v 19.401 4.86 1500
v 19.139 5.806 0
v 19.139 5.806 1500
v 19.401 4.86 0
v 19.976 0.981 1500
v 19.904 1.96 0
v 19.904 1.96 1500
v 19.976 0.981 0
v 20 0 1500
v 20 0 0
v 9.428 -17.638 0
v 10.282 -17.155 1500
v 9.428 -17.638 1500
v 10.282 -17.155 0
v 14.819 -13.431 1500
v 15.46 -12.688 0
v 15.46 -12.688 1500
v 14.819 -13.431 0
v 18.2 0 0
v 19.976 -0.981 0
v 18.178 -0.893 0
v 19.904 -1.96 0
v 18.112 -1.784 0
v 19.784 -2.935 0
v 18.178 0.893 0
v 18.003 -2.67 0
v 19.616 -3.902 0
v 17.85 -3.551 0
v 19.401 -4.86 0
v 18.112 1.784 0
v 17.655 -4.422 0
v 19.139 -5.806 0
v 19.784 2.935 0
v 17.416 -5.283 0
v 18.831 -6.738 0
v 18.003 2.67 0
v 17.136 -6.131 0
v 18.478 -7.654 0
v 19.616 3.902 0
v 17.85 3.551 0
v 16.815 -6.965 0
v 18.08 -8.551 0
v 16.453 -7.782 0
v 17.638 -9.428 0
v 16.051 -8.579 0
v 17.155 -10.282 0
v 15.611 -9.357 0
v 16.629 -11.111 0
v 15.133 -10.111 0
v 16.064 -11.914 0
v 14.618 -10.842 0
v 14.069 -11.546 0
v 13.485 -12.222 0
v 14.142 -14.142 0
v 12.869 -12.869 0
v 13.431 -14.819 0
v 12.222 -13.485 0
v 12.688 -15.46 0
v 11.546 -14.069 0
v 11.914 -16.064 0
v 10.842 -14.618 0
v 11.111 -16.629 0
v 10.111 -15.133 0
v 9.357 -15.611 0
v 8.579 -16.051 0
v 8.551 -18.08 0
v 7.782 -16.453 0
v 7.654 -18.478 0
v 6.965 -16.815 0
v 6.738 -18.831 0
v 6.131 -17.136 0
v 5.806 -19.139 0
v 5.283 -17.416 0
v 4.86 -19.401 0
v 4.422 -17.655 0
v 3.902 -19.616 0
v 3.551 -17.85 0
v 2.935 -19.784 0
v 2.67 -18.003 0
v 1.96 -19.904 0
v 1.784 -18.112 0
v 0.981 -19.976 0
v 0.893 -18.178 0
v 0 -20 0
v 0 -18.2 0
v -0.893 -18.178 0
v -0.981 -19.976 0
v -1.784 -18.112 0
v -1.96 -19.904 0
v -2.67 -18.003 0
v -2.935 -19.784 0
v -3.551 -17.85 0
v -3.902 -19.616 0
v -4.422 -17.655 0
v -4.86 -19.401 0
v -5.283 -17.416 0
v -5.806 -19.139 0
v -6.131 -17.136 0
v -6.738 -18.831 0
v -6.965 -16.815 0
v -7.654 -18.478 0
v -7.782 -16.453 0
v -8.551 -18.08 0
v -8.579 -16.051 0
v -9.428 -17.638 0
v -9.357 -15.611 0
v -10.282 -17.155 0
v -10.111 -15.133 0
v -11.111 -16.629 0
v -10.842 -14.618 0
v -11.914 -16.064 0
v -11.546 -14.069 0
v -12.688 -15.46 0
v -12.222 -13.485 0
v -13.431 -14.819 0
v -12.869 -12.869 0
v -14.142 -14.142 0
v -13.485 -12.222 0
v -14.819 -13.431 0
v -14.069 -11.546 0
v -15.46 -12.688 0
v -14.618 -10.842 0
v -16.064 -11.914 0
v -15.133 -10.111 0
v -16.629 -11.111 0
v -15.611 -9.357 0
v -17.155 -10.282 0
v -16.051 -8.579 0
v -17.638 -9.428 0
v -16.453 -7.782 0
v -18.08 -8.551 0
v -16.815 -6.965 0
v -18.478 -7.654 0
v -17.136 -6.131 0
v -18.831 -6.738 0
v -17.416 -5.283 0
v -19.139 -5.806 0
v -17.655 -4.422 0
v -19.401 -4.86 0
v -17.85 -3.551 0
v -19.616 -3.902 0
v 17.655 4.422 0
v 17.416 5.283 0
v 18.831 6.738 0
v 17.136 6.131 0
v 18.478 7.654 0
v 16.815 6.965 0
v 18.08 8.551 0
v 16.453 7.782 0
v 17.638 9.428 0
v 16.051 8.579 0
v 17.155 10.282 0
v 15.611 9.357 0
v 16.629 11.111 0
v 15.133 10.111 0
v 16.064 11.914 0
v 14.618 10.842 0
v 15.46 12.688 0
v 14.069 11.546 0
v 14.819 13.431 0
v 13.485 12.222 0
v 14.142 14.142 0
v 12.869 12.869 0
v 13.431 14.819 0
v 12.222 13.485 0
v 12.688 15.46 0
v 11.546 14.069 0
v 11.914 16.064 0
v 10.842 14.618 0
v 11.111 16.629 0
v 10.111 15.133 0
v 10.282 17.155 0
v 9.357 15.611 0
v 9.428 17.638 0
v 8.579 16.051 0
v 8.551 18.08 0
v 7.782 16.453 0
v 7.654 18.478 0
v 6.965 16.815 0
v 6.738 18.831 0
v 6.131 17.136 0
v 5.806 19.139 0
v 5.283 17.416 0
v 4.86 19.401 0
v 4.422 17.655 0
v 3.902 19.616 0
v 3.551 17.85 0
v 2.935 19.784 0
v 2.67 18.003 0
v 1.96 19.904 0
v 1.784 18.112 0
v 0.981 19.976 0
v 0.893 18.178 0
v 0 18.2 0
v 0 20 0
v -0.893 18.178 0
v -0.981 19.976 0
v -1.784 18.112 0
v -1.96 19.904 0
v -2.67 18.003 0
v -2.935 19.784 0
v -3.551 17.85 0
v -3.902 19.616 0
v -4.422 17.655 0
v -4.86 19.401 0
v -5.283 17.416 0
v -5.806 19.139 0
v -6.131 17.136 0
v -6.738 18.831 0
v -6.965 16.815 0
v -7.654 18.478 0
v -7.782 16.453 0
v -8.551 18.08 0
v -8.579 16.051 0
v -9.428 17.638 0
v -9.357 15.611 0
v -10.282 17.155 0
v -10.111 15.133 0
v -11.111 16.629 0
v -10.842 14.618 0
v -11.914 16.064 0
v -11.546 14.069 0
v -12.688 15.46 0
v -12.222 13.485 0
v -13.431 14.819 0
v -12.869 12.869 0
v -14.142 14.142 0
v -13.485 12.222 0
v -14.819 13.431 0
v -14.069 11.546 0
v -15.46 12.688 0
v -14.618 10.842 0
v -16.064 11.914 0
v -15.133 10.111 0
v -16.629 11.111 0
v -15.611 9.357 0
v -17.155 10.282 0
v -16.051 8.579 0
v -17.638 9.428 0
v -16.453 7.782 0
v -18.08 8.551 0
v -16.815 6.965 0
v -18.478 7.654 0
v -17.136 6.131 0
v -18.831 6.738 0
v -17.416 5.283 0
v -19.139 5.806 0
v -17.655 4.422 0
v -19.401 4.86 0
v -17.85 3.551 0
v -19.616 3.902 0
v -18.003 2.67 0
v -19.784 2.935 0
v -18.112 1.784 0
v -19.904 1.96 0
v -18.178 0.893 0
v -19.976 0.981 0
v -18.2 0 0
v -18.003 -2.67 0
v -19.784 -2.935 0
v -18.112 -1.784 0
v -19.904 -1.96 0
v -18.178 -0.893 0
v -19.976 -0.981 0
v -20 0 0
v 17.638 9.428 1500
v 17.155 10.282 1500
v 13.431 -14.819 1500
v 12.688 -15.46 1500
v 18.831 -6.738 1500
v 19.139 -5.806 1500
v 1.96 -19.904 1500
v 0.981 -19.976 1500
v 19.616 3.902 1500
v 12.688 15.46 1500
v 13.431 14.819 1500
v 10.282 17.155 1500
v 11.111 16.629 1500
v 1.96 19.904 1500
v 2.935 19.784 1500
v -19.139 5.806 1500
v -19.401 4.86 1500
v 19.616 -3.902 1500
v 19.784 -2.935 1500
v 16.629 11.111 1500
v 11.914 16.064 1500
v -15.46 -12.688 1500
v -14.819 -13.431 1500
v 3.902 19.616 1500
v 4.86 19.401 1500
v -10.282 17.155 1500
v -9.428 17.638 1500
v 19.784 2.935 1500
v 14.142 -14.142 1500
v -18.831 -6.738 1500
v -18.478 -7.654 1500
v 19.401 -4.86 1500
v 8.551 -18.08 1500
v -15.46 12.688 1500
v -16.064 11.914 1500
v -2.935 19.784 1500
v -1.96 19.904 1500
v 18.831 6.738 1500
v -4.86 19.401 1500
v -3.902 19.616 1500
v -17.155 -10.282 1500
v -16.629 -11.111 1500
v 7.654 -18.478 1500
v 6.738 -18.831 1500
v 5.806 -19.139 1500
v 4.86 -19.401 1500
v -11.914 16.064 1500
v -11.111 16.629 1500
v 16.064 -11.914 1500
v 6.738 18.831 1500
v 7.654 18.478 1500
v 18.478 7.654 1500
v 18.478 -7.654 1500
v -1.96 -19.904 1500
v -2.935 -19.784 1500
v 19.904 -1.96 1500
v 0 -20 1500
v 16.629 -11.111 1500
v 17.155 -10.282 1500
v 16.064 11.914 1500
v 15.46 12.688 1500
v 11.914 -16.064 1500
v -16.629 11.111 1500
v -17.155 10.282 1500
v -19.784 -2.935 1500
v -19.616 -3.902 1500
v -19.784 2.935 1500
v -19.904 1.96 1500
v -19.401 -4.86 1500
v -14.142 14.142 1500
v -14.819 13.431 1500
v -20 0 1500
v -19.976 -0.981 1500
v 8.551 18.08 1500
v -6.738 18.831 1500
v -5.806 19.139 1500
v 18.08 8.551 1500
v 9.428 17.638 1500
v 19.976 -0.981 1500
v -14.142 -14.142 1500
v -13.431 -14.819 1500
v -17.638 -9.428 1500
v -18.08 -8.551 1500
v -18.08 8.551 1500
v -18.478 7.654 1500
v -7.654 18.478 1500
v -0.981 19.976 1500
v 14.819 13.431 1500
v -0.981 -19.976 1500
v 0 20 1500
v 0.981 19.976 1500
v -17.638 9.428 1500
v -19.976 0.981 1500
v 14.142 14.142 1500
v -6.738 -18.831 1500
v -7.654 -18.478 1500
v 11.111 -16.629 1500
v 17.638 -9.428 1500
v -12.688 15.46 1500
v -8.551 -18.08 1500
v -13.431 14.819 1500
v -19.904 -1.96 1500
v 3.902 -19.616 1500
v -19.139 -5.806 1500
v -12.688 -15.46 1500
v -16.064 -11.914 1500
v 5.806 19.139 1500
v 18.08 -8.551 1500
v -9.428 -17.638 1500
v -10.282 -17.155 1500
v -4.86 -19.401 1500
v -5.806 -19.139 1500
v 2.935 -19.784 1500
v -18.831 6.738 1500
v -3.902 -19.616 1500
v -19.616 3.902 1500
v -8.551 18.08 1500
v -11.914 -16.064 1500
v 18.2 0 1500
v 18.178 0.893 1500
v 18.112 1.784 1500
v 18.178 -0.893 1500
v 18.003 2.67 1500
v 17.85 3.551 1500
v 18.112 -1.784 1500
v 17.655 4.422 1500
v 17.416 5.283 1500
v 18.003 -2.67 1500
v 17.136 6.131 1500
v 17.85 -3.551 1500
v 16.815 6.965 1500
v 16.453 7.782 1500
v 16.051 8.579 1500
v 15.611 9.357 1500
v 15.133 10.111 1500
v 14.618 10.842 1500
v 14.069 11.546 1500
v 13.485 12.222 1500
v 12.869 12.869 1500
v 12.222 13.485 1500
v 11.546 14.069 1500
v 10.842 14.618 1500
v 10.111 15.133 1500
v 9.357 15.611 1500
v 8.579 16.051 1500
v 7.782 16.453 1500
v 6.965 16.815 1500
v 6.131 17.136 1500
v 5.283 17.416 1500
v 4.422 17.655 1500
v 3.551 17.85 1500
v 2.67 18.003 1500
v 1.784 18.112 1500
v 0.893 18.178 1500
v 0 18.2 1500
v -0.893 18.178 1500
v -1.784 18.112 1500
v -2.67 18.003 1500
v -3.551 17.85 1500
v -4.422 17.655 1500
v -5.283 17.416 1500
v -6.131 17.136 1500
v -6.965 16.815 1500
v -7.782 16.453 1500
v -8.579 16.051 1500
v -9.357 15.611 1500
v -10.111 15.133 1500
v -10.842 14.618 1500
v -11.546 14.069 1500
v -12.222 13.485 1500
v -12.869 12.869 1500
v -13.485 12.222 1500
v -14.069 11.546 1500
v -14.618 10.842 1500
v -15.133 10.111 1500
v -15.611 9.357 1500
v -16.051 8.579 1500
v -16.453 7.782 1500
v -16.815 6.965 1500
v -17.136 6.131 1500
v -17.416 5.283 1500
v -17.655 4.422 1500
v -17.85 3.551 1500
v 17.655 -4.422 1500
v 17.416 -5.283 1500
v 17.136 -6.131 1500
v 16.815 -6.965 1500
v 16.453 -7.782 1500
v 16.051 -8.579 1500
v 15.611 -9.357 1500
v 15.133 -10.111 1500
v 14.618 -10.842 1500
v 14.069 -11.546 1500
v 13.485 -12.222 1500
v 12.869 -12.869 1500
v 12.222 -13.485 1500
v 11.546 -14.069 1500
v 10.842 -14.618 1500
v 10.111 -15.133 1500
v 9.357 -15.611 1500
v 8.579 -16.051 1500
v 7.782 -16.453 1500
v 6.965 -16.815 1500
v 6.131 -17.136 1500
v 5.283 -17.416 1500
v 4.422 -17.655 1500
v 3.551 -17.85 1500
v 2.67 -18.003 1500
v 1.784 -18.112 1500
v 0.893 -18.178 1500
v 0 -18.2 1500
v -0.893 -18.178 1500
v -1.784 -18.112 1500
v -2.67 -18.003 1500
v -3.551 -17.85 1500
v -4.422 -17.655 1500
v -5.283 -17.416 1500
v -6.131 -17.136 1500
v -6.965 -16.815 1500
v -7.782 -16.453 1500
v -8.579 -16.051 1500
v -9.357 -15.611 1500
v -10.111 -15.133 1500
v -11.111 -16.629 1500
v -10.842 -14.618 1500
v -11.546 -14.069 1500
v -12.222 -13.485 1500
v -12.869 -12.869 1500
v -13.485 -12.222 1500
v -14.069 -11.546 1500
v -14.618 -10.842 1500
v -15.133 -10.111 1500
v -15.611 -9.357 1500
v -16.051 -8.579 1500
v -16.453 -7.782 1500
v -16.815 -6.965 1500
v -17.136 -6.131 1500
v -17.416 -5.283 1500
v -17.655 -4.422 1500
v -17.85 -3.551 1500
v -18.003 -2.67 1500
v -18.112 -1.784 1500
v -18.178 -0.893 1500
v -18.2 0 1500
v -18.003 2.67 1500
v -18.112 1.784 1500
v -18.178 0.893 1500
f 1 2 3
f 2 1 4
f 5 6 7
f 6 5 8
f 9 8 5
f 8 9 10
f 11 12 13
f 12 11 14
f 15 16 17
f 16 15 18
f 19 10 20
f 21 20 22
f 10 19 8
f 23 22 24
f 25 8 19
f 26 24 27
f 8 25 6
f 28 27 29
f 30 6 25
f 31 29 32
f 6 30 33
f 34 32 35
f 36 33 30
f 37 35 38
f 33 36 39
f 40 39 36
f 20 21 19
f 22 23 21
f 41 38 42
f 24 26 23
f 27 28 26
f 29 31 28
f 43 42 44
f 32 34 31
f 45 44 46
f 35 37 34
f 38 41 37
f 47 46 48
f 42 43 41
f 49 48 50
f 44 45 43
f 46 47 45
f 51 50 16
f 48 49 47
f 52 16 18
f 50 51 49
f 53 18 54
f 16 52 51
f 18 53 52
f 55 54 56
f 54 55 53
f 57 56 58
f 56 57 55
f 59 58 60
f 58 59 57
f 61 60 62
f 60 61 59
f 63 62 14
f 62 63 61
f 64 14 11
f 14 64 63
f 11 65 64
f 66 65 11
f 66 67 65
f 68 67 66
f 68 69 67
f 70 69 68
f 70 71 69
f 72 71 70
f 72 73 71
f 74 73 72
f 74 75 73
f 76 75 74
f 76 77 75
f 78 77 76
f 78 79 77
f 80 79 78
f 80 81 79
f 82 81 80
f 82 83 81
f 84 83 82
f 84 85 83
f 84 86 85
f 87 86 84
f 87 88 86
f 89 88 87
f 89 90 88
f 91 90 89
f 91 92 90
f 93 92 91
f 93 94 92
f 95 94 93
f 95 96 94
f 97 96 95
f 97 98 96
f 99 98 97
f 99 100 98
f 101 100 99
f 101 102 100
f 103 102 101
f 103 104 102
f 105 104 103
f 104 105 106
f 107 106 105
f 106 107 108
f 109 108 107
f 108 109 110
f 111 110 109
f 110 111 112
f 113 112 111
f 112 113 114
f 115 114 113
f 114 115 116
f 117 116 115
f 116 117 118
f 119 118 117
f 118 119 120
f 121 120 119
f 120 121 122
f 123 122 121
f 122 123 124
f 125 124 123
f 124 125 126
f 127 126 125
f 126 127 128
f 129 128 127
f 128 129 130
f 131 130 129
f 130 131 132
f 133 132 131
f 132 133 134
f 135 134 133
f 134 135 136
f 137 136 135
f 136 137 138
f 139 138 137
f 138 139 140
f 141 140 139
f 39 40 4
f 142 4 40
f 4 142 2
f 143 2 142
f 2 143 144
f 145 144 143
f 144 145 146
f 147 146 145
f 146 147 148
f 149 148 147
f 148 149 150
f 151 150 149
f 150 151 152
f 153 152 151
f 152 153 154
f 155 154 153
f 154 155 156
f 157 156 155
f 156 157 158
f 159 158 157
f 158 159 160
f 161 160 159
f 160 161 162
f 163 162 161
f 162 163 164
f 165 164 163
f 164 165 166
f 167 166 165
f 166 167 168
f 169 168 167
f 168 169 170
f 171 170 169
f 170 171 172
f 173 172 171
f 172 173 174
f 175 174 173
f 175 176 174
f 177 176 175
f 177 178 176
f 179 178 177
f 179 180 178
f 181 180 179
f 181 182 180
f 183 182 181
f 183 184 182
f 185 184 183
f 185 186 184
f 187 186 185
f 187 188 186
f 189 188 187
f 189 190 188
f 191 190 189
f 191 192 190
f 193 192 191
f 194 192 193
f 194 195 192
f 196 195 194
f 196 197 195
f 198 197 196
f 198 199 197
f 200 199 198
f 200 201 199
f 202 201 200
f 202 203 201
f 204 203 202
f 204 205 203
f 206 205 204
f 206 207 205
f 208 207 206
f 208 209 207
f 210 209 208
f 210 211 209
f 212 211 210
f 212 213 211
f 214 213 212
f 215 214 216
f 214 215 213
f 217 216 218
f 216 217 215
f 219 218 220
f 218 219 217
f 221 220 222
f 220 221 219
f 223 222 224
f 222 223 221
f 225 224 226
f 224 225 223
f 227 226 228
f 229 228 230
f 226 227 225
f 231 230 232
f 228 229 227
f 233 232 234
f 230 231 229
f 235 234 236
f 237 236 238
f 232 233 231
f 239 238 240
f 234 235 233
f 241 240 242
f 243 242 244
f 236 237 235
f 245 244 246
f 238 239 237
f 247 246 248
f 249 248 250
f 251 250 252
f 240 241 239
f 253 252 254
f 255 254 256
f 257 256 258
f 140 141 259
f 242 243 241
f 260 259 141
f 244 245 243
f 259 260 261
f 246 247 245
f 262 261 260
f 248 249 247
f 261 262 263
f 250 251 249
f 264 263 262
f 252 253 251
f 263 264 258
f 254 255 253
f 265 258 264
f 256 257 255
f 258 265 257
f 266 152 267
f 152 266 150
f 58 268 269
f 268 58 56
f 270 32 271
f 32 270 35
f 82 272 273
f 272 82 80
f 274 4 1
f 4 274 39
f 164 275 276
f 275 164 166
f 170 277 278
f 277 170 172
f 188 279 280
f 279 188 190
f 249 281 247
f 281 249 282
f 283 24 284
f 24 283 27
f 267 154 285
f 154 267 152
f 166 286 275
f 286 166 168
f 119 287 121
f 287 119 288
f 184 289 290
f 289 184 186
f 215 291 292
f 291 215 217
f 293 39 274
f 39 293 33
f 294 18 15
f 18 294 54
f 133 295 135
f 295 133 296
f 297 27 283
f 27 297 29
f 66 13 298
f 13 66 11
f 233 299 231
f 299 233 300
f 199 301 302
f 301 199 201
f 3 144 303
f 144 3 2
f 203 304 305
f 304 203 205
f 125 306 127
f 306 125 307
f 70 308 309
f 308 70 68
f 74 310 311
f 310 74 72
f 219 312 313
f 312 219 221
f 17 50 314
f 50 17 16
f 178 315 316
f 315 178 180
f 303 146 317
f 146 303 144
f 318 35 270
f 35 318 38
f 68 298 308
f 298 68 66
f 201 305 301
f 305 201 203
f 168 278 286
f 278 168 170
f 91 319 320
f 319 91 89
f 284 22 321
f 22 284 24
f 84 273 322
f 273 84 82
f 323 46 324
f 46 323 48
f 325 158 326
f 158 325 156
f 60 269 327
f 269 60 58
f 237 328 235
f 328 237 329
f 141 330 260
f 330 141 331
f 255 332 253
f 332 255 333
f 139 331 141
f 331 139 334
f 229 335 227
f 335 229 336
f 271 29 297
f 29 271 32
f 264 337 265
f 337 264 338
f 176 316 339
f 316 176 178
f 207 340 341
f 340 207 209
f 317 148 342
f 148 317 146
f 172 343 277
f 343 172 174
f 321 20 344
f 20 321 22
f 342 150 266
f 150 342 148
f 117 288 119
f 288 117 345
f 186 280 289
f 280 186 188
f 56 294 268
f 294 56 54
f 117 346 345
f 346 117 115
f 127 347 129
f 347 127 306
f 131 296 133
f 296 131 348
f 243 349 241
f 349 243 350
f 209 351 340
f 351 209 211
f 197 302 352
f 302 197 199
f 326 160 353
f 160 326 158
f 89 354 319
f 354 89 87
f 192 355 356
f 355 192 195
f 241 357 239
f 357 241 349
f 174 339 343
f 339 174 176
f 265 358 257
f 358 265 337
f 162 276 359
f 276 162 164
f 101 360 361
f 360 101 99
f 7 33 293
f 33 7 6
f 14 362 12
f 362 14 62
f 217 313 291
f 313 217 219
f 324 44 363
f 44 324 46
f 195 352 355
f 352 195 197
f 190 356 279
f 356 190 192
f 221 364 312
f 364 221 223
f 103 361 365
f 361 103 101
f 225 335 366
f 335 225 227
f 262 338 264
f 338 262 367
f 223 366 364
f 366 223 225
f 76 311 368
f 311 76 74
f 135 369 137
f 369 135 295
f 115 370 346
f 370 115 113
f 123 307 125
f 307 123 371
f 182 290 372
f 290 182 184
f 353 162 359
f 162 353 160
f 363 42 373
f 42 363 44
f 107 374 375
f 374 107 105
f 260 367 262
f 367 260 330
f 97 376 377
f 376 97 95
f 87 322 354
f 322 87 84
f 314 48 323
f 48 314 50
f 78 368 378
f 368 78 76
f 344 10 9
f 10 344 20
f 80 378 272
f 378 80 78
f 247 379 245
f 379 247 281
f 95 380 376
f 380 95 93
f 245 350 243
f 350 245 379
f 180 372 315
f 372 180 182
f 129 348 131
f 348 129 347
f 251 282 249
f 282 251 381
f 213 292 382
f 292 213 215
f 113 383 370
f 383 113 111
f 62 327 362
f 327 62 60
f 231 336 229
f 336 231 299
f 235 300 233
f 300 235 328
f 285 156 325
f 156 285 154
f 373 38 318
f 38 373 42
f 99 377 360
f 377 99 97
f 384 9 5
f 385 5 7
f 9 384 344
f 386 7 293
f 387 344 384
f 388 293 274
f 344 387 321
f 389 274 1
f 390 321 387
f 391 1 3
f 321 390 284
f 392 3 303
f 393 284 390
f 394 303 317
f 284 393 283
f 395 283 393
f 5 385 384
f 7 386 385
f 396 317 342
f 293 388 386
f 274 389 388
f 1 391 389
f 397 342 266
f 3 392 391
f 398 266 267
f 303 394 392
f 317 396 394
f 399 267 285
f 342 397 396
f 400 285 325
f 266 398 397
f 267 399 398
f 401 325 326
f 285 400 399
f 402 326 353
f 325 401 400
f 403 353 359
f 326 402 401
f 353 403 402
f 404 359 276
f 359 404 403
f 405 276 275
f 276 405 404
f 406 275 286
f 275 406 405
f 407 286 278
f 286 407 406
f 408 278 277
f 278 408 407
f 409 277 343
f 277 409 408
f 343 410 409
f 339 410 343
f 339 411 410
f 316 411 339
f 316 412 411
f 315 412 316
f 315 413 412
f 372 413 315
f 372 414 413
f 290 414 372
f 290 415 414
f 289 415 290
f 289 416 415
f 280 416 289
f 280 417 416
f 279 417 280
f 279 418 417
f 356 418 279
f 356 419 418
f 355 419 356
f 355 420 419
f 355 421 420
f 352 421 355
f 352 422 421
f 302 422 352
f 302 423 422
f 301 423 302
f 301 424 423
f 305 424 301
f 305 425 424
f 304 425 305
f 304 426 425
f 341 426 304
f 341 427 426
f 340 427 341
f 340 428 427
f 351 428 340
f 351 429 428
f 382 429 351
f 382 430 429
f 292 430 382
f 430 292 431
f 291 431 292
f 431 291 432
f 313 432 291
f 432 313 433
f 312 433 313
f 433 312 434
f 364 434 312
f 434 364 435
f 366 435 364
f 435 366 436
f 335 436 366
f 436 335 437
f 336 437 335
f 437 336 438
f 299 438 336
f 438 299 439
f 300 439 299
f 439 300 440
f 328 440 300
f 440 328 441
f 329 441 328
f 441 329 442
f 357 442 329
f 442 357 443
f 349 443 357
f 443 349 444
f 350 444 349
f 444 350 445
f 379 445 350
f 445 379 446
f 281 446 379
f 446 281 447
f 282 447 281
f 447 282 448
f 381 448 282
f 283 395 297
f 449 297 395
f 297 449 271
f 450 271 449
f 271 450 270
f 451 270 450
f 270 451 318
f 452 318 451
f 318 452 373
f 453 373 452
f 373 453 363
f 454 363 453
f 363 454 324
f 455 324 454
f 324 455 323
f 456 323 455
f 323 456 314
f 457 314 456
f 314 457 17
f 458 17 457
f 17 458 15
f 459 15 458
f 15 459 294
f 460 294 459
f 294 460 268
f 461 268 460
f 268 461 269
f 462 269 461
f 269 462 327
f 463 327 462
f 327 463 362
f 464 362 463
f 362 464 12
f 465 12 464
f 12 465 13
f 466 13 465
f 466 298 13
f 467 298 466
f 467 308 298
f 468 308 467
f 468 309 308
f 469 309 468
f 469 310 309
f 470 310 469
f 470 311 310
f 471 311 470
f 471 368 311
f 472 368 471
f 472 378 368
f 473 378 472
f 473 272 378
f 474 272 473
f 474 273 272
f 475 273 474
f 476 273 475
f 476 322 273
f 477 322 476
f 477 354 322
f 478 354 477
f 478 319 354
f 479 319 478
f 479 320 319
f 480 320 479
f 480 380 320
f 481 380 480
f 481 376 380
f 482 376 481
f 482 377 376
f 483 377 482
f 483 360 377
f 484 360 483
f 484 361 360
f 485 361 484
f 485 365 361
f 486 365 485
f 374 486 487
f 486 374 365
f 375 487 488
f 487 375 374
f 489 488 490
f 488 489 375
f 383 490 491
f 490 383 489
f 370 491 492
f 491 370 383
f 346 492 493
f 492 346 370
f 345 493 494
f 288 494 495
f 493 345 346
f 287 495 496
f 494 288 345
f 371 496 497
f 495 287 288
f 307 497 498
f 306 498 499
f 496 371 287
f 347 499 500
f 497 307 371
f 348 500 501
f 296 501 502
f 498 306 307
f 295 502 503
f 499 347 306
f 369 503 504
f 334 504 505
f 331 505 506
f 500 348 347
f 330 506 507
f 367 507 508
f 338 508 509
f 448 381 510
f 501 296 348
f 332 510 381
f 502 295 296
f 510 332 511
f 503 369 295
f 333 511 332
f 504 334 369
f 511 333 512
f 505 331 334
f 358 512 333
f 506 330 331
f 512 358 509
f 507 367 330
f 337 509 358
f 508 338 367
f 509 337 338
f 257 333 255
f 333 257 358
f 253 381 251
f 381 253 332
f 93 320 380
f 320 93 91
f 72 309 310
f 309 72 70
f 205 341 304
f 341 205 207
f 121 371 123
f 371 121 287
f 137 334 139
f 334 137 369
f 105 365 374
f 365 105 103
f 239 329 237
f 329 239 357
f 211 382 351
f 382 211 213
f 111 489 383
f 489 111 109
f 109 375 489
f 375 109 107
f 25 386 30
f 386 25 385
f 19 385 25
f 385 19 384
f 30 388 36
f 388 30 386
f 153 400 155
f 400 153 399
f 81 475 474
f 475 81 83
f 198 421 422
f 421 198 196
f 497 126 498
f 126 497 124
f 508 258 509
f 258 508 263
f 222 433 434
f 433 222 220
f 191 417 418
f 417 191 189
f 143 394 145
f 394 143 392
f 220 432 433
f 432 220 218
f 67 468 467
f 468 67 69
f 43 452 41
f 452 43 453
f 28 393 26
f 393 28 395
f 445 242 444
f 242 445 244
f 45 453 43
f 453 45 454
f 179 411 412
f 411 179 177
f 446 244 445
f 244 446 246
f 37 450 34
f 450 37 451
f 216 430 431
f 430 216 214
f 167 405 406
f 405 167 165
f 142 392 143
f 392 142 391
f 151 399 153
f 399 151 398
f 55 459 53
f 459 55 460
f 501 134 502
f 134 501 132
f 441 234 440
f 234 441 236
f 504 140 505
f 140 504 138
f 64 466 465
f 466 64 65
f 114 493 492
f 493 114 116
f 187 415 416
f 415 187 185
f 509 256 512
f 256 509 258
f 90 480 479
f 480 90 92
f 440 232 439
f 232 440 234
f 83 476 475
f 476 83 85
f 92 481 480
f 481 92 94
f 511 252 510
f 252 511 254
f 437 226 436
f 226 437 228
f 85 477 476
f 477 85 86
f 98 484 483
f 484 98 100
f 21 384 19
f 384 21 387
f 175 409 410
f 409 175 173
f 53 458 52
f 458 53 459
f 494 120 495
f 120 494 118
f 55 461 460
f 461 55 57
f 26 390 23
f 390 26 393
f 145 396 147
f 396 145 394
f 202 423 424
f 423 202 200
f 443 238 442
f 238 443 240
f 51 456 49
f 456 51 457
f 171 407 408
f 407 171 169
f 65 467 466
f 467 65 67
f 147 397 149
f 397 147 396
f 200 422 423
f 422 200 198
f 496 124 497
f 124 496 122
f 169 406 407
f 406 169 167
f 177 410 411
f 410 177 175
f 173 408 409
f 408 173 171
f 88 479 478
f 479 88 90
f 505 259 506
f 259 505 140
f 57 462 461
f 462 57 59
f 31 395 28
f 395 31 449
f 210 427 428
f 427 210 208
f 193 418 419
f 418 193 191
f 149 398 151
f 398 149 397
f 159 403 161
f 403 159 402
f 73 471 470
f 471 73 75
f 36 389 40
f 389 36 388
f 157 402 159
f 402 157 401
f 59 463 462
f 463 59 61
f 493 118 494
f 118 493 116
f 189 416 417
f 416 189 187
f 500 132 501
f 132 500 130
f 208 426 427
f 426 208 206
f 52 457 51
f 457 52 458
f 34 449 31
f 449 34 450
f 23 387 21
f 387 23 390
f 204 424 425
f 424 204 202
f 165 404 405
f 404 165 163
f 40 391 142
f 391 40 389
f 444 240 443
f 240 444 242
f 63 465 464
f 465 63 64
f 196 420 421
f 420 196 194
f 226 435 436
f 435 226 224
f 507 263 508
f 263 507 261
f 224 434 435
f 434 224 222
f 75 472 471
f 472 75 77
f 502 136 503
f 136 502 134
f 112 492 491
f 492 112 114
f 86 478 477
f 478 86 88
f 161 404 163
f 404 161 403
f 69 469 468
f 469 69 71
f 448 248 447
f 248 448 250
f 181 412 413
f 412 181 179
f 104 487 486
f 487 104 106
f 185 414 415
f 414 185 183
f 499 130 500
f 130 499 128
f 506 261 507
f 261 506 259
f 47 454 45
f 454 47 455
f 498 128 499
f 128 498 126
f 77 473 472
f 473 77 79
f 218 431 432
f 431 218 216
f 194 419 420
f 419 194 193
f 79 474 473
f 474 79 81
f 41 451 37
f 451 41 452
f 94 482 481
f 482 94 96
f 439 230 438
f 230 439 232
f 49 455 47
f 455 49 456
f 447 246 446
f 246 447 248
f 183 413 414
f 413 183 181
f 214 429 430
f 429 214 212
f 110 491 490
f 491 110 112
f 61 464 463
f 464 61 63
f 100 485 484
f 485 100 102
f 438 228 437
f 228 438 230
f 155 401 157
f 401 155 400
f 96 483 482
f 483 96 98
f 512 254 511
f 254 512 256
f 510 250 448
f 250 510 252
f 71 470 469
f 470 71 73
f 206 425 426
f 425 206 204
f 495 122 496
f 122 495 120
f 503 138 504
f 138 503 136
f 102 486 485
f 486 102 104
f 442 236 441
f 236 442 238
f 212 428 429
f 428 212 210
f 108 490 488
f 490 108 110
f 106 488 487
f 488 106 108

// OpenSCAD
$fn = 128;

// HT 40 pipe (approx.): DN 40, OD 40 mm, typical wall ~1.8 mm
pipe_length = 1500;     // mm
outer_diameter = 40;    // mm
wall_thickness = 1.8;   // mm

inner_diameter = outer_diameter - 2*wall_thickness;

difference() {
  cylinder(h = pipe_length, d = outer_diameter, center = false);
  translate([0,0,-0.1])
    cylinder(h = pipe_length + 0.2, d = inner_diameter, center = false);
}
